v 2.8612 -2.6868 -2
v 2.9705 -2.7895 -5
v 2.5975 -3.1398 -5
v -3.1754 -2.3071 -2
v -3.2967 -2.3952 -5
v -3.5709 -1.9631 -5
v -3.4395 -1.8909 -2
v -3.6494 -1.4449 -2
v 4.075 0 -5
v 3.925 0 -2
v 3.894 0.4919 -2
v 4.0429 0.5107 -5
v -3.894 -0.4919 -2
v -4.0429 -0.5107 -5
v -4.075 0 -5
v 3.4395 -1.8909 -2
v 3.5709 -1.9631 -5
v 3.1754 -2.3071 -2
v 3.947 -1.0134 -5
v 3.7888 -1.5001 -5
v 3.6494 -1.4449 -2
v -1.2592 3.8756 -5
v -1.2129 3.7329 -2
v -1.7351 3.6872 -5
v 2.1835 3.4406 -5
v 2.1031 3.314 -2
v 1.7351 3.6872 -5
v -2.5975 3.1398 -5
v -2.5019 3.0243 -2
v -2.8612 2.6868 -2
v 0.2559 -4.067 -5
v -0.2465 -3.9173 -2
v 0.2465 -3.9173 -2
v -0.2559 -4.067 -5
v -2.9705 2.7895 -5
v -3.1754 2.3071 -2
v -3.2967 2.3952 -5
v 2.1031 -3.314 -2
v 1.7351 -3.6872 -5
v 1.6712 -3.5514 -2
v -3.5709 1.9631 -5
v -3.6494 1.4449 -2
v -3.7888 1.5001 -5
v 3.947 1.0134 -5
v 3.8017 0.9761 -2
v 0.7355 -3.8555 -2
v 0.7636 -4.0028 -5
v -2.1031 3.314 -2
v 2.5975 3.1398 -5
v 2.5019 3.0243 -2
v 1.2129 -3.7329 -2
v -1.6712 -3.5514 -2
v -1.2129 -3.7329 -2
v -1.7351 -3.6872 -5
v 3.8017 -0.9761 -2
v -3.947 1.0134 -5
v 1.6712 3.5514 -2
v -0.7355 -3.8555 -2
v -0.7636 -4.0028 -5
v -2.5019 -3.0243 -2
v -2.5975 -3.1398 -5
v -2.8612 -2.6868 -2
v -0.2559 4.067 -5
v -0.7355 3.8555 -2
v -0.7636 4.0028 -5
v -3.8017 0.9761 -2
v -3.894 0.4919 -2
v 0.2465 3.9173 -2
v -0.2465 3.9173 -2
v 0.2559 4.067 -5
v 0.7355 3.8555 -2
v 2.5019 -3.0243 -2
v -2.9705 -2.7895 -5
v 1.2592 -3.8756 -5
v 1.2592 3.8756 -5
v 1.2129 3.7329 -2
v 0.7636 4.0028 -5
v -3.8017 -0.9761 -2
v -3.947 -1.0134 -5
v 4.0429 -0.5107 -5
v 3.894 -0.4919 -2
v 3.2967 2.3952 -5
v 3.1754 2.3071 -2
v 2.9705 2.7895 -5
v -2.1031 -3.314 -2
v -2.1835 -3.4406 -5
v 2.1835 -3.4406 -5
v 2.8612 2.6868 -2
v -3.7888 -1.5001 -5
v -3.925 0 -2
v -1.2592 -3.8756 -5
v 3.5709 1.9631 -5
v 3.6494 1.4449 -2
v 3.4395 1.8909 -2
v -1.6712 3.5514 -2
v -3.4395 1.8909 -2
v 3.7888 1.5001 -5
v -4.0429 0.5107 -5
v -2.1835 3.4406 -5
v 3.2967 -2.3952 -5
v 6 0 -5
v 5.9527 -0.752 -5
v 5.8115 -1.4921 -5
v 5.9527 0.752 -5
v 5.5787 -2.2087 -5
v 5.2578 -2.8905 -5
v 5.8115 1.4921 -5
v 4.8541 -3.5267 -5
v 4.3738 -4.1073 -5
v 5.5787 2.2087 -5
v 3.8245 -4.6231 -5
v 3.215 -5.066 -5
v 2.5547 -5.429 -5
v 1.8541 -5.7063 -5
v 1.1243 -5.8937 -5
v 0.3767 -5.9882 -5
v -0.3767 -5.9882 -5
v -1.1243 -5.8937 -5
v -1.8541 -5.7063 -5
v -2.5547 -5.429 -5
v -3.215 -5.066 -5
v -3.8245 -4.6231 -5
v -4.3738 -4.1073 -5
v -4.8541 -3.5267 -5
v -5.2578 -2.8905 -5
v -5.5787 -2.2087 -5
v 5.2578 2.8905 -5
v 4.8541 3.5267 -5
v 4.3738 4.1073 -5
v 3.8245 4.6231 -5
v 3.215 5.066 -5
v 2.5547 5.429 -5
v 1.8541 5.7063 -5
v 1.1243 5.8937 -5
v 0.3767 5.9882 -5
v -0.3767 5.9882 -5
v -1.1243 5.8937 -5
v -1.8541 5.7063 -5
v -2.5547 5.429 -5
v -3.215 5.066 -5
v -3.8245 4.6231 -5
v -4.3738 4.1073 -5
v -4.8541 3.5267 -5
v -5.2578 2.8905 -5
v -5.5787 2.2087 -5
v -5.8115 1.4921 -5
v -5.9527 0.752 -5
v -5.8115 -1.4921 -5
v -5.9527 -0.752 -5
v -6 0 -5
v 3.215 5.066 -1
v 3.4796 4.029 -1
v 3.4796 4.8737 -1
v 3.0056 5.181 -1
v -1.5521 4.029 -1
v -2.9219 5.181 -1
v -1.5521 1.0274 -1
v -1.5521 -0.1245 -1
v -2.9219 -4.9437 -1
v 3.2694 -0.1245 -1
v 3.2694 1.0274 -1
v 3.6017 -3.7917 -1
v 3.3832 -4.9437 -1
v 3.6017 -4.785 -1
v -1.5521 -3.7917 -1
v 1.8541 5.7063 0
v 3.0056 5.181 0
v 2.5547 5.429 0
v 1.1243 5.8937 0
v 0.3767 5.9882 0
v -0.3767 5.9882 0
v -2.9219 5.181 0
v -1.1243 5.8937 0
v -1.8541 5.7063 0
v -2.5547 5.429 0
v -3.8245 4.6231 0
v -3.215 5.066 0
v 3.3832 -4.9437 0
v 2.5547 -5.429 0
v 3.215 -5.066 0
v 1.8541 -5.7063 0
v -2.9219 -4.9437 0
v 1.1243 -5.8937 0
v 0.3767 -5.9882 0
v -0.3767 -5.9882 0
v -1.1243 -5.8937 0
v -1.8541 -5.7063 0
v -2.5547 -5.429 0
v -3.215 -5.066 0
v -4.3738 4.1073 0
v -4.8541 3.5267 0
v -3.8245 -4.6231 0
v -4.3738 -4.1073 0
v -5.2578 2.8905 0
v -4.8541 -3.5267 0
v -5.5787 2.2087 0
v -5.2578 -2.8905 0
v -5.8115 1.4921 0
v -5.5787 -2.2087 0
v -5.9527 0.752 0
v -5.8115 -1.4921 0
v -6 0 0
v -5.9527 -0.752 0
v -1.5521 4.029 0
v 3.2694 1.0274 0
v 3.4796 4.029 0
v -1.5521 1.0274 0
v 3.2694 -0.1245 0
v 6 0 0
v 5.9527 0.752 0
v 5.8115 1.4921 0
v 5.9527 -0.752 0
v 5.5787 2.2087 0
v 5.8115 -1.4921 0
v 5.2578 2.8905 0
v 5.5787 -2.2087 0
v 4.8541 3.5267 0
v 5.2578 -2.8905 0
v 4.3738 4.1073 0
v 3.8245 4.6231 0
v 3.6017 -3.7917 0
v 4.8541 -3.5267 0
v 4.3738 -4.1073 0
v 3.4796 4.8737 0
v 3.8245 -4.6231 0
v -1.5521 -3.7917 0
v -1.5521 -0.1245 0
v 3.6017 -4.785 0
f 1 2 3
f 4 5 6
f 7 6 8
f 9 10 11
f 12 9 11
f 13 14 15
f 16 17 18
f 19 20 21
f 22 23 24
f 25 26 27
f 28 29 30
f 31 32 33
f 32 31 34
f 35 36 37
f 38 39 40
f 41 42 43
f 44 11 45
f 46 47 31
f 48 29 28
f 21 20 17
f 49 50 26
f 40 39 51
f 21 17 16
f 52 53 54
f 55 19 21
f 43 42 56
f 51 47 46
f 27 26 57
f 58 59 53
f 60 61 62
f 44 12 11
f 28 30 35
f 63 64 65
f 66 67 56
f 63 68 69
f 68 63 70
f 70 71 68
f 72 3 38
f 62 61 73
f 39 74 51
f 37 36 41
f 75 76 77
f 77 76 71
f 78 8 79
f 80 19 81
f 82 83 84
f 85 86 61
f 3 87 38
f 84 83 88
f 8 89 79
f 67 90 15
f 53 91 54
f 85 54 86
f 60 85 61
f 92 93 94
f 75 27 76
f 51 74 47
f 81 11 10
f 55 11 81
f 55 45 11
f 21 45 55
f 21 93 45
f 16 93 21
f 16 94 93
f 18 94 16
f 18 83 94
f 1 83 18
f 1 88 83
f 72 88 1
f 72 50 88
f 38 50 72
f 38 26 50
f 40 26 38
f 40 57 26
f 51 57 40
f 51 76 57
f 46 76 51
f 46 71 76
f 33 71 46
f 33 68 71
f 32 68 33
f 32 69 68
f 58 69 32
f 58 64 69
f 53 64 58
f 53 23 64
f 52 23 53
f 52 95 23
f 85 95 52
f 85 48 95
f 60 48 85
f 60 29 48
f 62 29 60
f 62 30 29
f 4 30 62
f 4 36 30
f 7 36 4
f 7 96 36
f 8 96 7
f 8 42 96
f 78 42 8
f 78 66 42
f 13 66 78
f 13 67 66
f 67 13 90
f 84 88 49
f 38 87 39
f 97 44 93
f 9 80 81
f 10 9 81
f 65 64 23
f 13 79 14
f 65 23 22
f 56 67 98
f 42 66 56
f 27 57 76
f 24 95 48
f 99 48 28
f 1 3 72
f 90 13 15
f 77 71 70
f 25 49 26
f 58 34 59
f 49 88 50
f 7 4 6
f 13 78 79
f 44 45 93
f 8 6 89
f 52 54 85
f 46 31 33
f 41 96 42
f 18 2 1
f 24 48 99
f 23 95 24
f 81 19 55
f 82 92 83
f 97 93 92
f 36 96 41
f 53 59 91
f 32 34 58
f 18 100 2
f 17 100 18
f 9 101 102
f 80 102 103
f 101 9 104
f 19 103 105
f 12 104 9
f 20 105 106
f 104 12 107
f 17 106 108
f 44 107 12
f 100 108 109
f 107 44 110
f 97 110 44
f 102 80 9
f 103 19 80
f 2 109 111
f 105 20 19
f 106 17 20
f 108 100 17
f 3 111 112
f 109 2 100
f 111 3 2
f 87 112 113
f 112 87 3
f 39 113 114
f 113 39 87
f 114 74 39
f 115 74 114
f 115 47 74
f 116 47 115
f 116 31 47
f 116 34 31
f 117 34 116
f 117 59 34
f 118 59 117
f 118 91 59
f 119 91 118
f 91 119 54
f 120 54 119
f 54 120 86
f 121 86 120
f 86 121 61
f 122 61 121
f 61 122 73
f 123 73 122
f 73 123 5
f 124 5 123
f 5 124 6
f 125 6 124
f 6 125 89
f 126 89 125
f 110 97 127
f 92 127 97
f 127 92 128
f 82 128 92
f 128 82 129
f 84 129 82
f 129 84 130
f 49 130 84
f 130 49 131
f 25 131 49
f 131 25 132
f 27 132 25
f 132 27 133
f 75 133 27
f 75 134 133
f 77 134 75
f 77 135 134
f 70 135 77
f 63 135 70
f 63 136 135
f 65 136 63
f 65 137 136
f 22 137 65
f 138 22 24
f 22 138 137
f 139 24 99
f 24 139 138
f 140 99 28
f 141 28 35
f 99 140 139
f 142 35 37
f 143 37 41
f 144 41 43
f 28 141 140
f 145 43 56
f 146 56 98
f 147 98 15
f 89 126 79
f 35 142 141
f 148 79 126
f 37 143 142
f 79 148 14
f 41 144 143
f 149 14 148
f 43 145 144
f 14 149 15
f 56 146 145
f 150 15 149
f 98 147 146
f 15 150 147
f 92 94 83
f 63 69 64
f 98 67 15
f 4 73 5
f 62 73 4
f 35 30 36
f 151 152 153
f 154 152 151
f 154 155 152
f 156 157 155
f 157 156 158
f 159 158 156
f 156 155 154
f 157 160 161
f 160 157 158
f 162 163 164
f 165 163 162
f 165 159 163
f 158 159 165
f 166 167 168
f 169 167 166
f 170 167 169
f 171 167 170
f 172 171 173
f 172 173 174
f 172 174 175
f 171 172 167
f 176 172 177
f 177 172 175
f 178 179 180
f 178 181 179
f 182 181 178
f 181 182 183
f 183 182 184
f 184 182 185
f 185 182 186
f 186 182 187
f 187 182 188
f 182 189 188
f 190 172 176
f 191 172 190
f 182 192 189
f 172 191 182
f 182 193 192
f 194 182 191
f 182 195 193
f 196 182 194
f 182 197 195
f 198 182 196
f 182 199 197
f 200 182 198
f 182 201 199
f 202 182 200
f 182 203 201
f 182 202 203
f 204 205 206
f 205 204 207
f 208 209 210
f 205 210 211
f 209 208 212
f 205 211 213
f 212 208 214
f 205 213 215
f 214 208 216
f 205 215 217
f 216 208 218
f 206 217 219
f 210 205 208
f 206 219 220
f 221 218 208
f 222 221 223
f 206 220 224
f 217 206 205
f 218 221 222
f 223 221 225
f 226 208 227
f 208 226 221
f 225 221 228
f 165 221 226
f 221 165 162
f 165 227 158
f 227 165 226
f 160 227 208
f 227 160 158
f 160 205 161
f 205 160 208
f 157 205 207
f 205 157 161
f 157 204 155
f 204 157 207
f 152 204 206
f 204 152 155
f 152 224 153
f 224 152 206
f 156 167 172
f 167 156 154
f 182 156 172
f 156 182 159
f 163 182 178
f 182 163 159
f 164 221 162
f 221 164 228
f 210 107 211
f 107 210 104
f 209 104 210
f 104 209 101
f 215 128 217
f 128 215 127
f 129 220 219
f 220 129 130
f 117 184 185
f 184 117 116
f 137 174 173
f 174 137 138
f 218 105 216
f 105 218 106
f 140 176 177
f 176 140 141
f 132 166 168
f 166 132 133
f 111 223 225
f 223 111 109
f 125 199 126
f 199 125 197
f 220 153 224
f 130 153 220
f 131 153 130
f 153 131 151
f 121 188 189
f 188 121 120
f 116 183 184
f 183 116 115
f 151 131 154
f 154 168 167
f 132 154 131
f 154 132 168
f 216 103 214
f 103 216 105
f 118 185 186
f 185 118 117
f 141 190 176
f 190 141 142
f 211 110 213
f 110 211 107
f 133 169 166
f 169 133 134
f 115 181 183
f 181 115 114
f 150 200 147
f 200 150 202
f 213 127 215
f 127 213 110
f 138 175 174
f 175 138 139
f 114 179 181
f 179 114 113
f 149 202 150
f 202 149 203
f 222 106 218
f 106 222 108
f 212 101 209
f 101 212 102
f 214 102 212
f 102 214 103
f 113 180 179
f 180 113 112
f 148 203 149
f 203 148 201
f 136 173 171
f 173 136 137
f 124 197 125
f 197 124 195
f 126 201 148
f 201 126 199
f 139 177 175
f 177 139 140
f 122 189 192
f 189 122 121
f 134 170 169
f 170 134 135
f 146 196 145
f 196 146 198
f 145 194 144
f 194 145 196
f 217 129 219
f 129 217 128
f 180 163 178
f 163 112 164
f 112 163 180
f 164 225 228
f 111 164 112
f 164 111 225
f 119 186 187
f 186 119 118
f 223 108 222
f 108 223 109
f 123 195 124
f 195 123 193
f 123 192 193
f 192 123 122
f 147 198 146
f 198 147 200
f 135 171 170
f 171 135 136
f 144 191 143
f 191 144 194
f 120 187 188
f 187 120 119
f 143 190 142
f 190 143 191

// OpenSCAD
$fn = 50;

difference() {
	union() {
		translate(v = [0, 0, -5.0]) {
			cylinder(h = 5, r = 6.0);
		}
	}
	union() {
		#translate(v = [0, 0, -5.0]) {
			cylinder(h = 3, r1 = 4.075, r2 = 3.925);
		}
		translate(v = [0, 0, -1]) {
			linear_extrude(height = 1) {
				text(font = "Impact", halign = "center", size = 10, text = "E", valign = "center");
			}
		}
	}
}
